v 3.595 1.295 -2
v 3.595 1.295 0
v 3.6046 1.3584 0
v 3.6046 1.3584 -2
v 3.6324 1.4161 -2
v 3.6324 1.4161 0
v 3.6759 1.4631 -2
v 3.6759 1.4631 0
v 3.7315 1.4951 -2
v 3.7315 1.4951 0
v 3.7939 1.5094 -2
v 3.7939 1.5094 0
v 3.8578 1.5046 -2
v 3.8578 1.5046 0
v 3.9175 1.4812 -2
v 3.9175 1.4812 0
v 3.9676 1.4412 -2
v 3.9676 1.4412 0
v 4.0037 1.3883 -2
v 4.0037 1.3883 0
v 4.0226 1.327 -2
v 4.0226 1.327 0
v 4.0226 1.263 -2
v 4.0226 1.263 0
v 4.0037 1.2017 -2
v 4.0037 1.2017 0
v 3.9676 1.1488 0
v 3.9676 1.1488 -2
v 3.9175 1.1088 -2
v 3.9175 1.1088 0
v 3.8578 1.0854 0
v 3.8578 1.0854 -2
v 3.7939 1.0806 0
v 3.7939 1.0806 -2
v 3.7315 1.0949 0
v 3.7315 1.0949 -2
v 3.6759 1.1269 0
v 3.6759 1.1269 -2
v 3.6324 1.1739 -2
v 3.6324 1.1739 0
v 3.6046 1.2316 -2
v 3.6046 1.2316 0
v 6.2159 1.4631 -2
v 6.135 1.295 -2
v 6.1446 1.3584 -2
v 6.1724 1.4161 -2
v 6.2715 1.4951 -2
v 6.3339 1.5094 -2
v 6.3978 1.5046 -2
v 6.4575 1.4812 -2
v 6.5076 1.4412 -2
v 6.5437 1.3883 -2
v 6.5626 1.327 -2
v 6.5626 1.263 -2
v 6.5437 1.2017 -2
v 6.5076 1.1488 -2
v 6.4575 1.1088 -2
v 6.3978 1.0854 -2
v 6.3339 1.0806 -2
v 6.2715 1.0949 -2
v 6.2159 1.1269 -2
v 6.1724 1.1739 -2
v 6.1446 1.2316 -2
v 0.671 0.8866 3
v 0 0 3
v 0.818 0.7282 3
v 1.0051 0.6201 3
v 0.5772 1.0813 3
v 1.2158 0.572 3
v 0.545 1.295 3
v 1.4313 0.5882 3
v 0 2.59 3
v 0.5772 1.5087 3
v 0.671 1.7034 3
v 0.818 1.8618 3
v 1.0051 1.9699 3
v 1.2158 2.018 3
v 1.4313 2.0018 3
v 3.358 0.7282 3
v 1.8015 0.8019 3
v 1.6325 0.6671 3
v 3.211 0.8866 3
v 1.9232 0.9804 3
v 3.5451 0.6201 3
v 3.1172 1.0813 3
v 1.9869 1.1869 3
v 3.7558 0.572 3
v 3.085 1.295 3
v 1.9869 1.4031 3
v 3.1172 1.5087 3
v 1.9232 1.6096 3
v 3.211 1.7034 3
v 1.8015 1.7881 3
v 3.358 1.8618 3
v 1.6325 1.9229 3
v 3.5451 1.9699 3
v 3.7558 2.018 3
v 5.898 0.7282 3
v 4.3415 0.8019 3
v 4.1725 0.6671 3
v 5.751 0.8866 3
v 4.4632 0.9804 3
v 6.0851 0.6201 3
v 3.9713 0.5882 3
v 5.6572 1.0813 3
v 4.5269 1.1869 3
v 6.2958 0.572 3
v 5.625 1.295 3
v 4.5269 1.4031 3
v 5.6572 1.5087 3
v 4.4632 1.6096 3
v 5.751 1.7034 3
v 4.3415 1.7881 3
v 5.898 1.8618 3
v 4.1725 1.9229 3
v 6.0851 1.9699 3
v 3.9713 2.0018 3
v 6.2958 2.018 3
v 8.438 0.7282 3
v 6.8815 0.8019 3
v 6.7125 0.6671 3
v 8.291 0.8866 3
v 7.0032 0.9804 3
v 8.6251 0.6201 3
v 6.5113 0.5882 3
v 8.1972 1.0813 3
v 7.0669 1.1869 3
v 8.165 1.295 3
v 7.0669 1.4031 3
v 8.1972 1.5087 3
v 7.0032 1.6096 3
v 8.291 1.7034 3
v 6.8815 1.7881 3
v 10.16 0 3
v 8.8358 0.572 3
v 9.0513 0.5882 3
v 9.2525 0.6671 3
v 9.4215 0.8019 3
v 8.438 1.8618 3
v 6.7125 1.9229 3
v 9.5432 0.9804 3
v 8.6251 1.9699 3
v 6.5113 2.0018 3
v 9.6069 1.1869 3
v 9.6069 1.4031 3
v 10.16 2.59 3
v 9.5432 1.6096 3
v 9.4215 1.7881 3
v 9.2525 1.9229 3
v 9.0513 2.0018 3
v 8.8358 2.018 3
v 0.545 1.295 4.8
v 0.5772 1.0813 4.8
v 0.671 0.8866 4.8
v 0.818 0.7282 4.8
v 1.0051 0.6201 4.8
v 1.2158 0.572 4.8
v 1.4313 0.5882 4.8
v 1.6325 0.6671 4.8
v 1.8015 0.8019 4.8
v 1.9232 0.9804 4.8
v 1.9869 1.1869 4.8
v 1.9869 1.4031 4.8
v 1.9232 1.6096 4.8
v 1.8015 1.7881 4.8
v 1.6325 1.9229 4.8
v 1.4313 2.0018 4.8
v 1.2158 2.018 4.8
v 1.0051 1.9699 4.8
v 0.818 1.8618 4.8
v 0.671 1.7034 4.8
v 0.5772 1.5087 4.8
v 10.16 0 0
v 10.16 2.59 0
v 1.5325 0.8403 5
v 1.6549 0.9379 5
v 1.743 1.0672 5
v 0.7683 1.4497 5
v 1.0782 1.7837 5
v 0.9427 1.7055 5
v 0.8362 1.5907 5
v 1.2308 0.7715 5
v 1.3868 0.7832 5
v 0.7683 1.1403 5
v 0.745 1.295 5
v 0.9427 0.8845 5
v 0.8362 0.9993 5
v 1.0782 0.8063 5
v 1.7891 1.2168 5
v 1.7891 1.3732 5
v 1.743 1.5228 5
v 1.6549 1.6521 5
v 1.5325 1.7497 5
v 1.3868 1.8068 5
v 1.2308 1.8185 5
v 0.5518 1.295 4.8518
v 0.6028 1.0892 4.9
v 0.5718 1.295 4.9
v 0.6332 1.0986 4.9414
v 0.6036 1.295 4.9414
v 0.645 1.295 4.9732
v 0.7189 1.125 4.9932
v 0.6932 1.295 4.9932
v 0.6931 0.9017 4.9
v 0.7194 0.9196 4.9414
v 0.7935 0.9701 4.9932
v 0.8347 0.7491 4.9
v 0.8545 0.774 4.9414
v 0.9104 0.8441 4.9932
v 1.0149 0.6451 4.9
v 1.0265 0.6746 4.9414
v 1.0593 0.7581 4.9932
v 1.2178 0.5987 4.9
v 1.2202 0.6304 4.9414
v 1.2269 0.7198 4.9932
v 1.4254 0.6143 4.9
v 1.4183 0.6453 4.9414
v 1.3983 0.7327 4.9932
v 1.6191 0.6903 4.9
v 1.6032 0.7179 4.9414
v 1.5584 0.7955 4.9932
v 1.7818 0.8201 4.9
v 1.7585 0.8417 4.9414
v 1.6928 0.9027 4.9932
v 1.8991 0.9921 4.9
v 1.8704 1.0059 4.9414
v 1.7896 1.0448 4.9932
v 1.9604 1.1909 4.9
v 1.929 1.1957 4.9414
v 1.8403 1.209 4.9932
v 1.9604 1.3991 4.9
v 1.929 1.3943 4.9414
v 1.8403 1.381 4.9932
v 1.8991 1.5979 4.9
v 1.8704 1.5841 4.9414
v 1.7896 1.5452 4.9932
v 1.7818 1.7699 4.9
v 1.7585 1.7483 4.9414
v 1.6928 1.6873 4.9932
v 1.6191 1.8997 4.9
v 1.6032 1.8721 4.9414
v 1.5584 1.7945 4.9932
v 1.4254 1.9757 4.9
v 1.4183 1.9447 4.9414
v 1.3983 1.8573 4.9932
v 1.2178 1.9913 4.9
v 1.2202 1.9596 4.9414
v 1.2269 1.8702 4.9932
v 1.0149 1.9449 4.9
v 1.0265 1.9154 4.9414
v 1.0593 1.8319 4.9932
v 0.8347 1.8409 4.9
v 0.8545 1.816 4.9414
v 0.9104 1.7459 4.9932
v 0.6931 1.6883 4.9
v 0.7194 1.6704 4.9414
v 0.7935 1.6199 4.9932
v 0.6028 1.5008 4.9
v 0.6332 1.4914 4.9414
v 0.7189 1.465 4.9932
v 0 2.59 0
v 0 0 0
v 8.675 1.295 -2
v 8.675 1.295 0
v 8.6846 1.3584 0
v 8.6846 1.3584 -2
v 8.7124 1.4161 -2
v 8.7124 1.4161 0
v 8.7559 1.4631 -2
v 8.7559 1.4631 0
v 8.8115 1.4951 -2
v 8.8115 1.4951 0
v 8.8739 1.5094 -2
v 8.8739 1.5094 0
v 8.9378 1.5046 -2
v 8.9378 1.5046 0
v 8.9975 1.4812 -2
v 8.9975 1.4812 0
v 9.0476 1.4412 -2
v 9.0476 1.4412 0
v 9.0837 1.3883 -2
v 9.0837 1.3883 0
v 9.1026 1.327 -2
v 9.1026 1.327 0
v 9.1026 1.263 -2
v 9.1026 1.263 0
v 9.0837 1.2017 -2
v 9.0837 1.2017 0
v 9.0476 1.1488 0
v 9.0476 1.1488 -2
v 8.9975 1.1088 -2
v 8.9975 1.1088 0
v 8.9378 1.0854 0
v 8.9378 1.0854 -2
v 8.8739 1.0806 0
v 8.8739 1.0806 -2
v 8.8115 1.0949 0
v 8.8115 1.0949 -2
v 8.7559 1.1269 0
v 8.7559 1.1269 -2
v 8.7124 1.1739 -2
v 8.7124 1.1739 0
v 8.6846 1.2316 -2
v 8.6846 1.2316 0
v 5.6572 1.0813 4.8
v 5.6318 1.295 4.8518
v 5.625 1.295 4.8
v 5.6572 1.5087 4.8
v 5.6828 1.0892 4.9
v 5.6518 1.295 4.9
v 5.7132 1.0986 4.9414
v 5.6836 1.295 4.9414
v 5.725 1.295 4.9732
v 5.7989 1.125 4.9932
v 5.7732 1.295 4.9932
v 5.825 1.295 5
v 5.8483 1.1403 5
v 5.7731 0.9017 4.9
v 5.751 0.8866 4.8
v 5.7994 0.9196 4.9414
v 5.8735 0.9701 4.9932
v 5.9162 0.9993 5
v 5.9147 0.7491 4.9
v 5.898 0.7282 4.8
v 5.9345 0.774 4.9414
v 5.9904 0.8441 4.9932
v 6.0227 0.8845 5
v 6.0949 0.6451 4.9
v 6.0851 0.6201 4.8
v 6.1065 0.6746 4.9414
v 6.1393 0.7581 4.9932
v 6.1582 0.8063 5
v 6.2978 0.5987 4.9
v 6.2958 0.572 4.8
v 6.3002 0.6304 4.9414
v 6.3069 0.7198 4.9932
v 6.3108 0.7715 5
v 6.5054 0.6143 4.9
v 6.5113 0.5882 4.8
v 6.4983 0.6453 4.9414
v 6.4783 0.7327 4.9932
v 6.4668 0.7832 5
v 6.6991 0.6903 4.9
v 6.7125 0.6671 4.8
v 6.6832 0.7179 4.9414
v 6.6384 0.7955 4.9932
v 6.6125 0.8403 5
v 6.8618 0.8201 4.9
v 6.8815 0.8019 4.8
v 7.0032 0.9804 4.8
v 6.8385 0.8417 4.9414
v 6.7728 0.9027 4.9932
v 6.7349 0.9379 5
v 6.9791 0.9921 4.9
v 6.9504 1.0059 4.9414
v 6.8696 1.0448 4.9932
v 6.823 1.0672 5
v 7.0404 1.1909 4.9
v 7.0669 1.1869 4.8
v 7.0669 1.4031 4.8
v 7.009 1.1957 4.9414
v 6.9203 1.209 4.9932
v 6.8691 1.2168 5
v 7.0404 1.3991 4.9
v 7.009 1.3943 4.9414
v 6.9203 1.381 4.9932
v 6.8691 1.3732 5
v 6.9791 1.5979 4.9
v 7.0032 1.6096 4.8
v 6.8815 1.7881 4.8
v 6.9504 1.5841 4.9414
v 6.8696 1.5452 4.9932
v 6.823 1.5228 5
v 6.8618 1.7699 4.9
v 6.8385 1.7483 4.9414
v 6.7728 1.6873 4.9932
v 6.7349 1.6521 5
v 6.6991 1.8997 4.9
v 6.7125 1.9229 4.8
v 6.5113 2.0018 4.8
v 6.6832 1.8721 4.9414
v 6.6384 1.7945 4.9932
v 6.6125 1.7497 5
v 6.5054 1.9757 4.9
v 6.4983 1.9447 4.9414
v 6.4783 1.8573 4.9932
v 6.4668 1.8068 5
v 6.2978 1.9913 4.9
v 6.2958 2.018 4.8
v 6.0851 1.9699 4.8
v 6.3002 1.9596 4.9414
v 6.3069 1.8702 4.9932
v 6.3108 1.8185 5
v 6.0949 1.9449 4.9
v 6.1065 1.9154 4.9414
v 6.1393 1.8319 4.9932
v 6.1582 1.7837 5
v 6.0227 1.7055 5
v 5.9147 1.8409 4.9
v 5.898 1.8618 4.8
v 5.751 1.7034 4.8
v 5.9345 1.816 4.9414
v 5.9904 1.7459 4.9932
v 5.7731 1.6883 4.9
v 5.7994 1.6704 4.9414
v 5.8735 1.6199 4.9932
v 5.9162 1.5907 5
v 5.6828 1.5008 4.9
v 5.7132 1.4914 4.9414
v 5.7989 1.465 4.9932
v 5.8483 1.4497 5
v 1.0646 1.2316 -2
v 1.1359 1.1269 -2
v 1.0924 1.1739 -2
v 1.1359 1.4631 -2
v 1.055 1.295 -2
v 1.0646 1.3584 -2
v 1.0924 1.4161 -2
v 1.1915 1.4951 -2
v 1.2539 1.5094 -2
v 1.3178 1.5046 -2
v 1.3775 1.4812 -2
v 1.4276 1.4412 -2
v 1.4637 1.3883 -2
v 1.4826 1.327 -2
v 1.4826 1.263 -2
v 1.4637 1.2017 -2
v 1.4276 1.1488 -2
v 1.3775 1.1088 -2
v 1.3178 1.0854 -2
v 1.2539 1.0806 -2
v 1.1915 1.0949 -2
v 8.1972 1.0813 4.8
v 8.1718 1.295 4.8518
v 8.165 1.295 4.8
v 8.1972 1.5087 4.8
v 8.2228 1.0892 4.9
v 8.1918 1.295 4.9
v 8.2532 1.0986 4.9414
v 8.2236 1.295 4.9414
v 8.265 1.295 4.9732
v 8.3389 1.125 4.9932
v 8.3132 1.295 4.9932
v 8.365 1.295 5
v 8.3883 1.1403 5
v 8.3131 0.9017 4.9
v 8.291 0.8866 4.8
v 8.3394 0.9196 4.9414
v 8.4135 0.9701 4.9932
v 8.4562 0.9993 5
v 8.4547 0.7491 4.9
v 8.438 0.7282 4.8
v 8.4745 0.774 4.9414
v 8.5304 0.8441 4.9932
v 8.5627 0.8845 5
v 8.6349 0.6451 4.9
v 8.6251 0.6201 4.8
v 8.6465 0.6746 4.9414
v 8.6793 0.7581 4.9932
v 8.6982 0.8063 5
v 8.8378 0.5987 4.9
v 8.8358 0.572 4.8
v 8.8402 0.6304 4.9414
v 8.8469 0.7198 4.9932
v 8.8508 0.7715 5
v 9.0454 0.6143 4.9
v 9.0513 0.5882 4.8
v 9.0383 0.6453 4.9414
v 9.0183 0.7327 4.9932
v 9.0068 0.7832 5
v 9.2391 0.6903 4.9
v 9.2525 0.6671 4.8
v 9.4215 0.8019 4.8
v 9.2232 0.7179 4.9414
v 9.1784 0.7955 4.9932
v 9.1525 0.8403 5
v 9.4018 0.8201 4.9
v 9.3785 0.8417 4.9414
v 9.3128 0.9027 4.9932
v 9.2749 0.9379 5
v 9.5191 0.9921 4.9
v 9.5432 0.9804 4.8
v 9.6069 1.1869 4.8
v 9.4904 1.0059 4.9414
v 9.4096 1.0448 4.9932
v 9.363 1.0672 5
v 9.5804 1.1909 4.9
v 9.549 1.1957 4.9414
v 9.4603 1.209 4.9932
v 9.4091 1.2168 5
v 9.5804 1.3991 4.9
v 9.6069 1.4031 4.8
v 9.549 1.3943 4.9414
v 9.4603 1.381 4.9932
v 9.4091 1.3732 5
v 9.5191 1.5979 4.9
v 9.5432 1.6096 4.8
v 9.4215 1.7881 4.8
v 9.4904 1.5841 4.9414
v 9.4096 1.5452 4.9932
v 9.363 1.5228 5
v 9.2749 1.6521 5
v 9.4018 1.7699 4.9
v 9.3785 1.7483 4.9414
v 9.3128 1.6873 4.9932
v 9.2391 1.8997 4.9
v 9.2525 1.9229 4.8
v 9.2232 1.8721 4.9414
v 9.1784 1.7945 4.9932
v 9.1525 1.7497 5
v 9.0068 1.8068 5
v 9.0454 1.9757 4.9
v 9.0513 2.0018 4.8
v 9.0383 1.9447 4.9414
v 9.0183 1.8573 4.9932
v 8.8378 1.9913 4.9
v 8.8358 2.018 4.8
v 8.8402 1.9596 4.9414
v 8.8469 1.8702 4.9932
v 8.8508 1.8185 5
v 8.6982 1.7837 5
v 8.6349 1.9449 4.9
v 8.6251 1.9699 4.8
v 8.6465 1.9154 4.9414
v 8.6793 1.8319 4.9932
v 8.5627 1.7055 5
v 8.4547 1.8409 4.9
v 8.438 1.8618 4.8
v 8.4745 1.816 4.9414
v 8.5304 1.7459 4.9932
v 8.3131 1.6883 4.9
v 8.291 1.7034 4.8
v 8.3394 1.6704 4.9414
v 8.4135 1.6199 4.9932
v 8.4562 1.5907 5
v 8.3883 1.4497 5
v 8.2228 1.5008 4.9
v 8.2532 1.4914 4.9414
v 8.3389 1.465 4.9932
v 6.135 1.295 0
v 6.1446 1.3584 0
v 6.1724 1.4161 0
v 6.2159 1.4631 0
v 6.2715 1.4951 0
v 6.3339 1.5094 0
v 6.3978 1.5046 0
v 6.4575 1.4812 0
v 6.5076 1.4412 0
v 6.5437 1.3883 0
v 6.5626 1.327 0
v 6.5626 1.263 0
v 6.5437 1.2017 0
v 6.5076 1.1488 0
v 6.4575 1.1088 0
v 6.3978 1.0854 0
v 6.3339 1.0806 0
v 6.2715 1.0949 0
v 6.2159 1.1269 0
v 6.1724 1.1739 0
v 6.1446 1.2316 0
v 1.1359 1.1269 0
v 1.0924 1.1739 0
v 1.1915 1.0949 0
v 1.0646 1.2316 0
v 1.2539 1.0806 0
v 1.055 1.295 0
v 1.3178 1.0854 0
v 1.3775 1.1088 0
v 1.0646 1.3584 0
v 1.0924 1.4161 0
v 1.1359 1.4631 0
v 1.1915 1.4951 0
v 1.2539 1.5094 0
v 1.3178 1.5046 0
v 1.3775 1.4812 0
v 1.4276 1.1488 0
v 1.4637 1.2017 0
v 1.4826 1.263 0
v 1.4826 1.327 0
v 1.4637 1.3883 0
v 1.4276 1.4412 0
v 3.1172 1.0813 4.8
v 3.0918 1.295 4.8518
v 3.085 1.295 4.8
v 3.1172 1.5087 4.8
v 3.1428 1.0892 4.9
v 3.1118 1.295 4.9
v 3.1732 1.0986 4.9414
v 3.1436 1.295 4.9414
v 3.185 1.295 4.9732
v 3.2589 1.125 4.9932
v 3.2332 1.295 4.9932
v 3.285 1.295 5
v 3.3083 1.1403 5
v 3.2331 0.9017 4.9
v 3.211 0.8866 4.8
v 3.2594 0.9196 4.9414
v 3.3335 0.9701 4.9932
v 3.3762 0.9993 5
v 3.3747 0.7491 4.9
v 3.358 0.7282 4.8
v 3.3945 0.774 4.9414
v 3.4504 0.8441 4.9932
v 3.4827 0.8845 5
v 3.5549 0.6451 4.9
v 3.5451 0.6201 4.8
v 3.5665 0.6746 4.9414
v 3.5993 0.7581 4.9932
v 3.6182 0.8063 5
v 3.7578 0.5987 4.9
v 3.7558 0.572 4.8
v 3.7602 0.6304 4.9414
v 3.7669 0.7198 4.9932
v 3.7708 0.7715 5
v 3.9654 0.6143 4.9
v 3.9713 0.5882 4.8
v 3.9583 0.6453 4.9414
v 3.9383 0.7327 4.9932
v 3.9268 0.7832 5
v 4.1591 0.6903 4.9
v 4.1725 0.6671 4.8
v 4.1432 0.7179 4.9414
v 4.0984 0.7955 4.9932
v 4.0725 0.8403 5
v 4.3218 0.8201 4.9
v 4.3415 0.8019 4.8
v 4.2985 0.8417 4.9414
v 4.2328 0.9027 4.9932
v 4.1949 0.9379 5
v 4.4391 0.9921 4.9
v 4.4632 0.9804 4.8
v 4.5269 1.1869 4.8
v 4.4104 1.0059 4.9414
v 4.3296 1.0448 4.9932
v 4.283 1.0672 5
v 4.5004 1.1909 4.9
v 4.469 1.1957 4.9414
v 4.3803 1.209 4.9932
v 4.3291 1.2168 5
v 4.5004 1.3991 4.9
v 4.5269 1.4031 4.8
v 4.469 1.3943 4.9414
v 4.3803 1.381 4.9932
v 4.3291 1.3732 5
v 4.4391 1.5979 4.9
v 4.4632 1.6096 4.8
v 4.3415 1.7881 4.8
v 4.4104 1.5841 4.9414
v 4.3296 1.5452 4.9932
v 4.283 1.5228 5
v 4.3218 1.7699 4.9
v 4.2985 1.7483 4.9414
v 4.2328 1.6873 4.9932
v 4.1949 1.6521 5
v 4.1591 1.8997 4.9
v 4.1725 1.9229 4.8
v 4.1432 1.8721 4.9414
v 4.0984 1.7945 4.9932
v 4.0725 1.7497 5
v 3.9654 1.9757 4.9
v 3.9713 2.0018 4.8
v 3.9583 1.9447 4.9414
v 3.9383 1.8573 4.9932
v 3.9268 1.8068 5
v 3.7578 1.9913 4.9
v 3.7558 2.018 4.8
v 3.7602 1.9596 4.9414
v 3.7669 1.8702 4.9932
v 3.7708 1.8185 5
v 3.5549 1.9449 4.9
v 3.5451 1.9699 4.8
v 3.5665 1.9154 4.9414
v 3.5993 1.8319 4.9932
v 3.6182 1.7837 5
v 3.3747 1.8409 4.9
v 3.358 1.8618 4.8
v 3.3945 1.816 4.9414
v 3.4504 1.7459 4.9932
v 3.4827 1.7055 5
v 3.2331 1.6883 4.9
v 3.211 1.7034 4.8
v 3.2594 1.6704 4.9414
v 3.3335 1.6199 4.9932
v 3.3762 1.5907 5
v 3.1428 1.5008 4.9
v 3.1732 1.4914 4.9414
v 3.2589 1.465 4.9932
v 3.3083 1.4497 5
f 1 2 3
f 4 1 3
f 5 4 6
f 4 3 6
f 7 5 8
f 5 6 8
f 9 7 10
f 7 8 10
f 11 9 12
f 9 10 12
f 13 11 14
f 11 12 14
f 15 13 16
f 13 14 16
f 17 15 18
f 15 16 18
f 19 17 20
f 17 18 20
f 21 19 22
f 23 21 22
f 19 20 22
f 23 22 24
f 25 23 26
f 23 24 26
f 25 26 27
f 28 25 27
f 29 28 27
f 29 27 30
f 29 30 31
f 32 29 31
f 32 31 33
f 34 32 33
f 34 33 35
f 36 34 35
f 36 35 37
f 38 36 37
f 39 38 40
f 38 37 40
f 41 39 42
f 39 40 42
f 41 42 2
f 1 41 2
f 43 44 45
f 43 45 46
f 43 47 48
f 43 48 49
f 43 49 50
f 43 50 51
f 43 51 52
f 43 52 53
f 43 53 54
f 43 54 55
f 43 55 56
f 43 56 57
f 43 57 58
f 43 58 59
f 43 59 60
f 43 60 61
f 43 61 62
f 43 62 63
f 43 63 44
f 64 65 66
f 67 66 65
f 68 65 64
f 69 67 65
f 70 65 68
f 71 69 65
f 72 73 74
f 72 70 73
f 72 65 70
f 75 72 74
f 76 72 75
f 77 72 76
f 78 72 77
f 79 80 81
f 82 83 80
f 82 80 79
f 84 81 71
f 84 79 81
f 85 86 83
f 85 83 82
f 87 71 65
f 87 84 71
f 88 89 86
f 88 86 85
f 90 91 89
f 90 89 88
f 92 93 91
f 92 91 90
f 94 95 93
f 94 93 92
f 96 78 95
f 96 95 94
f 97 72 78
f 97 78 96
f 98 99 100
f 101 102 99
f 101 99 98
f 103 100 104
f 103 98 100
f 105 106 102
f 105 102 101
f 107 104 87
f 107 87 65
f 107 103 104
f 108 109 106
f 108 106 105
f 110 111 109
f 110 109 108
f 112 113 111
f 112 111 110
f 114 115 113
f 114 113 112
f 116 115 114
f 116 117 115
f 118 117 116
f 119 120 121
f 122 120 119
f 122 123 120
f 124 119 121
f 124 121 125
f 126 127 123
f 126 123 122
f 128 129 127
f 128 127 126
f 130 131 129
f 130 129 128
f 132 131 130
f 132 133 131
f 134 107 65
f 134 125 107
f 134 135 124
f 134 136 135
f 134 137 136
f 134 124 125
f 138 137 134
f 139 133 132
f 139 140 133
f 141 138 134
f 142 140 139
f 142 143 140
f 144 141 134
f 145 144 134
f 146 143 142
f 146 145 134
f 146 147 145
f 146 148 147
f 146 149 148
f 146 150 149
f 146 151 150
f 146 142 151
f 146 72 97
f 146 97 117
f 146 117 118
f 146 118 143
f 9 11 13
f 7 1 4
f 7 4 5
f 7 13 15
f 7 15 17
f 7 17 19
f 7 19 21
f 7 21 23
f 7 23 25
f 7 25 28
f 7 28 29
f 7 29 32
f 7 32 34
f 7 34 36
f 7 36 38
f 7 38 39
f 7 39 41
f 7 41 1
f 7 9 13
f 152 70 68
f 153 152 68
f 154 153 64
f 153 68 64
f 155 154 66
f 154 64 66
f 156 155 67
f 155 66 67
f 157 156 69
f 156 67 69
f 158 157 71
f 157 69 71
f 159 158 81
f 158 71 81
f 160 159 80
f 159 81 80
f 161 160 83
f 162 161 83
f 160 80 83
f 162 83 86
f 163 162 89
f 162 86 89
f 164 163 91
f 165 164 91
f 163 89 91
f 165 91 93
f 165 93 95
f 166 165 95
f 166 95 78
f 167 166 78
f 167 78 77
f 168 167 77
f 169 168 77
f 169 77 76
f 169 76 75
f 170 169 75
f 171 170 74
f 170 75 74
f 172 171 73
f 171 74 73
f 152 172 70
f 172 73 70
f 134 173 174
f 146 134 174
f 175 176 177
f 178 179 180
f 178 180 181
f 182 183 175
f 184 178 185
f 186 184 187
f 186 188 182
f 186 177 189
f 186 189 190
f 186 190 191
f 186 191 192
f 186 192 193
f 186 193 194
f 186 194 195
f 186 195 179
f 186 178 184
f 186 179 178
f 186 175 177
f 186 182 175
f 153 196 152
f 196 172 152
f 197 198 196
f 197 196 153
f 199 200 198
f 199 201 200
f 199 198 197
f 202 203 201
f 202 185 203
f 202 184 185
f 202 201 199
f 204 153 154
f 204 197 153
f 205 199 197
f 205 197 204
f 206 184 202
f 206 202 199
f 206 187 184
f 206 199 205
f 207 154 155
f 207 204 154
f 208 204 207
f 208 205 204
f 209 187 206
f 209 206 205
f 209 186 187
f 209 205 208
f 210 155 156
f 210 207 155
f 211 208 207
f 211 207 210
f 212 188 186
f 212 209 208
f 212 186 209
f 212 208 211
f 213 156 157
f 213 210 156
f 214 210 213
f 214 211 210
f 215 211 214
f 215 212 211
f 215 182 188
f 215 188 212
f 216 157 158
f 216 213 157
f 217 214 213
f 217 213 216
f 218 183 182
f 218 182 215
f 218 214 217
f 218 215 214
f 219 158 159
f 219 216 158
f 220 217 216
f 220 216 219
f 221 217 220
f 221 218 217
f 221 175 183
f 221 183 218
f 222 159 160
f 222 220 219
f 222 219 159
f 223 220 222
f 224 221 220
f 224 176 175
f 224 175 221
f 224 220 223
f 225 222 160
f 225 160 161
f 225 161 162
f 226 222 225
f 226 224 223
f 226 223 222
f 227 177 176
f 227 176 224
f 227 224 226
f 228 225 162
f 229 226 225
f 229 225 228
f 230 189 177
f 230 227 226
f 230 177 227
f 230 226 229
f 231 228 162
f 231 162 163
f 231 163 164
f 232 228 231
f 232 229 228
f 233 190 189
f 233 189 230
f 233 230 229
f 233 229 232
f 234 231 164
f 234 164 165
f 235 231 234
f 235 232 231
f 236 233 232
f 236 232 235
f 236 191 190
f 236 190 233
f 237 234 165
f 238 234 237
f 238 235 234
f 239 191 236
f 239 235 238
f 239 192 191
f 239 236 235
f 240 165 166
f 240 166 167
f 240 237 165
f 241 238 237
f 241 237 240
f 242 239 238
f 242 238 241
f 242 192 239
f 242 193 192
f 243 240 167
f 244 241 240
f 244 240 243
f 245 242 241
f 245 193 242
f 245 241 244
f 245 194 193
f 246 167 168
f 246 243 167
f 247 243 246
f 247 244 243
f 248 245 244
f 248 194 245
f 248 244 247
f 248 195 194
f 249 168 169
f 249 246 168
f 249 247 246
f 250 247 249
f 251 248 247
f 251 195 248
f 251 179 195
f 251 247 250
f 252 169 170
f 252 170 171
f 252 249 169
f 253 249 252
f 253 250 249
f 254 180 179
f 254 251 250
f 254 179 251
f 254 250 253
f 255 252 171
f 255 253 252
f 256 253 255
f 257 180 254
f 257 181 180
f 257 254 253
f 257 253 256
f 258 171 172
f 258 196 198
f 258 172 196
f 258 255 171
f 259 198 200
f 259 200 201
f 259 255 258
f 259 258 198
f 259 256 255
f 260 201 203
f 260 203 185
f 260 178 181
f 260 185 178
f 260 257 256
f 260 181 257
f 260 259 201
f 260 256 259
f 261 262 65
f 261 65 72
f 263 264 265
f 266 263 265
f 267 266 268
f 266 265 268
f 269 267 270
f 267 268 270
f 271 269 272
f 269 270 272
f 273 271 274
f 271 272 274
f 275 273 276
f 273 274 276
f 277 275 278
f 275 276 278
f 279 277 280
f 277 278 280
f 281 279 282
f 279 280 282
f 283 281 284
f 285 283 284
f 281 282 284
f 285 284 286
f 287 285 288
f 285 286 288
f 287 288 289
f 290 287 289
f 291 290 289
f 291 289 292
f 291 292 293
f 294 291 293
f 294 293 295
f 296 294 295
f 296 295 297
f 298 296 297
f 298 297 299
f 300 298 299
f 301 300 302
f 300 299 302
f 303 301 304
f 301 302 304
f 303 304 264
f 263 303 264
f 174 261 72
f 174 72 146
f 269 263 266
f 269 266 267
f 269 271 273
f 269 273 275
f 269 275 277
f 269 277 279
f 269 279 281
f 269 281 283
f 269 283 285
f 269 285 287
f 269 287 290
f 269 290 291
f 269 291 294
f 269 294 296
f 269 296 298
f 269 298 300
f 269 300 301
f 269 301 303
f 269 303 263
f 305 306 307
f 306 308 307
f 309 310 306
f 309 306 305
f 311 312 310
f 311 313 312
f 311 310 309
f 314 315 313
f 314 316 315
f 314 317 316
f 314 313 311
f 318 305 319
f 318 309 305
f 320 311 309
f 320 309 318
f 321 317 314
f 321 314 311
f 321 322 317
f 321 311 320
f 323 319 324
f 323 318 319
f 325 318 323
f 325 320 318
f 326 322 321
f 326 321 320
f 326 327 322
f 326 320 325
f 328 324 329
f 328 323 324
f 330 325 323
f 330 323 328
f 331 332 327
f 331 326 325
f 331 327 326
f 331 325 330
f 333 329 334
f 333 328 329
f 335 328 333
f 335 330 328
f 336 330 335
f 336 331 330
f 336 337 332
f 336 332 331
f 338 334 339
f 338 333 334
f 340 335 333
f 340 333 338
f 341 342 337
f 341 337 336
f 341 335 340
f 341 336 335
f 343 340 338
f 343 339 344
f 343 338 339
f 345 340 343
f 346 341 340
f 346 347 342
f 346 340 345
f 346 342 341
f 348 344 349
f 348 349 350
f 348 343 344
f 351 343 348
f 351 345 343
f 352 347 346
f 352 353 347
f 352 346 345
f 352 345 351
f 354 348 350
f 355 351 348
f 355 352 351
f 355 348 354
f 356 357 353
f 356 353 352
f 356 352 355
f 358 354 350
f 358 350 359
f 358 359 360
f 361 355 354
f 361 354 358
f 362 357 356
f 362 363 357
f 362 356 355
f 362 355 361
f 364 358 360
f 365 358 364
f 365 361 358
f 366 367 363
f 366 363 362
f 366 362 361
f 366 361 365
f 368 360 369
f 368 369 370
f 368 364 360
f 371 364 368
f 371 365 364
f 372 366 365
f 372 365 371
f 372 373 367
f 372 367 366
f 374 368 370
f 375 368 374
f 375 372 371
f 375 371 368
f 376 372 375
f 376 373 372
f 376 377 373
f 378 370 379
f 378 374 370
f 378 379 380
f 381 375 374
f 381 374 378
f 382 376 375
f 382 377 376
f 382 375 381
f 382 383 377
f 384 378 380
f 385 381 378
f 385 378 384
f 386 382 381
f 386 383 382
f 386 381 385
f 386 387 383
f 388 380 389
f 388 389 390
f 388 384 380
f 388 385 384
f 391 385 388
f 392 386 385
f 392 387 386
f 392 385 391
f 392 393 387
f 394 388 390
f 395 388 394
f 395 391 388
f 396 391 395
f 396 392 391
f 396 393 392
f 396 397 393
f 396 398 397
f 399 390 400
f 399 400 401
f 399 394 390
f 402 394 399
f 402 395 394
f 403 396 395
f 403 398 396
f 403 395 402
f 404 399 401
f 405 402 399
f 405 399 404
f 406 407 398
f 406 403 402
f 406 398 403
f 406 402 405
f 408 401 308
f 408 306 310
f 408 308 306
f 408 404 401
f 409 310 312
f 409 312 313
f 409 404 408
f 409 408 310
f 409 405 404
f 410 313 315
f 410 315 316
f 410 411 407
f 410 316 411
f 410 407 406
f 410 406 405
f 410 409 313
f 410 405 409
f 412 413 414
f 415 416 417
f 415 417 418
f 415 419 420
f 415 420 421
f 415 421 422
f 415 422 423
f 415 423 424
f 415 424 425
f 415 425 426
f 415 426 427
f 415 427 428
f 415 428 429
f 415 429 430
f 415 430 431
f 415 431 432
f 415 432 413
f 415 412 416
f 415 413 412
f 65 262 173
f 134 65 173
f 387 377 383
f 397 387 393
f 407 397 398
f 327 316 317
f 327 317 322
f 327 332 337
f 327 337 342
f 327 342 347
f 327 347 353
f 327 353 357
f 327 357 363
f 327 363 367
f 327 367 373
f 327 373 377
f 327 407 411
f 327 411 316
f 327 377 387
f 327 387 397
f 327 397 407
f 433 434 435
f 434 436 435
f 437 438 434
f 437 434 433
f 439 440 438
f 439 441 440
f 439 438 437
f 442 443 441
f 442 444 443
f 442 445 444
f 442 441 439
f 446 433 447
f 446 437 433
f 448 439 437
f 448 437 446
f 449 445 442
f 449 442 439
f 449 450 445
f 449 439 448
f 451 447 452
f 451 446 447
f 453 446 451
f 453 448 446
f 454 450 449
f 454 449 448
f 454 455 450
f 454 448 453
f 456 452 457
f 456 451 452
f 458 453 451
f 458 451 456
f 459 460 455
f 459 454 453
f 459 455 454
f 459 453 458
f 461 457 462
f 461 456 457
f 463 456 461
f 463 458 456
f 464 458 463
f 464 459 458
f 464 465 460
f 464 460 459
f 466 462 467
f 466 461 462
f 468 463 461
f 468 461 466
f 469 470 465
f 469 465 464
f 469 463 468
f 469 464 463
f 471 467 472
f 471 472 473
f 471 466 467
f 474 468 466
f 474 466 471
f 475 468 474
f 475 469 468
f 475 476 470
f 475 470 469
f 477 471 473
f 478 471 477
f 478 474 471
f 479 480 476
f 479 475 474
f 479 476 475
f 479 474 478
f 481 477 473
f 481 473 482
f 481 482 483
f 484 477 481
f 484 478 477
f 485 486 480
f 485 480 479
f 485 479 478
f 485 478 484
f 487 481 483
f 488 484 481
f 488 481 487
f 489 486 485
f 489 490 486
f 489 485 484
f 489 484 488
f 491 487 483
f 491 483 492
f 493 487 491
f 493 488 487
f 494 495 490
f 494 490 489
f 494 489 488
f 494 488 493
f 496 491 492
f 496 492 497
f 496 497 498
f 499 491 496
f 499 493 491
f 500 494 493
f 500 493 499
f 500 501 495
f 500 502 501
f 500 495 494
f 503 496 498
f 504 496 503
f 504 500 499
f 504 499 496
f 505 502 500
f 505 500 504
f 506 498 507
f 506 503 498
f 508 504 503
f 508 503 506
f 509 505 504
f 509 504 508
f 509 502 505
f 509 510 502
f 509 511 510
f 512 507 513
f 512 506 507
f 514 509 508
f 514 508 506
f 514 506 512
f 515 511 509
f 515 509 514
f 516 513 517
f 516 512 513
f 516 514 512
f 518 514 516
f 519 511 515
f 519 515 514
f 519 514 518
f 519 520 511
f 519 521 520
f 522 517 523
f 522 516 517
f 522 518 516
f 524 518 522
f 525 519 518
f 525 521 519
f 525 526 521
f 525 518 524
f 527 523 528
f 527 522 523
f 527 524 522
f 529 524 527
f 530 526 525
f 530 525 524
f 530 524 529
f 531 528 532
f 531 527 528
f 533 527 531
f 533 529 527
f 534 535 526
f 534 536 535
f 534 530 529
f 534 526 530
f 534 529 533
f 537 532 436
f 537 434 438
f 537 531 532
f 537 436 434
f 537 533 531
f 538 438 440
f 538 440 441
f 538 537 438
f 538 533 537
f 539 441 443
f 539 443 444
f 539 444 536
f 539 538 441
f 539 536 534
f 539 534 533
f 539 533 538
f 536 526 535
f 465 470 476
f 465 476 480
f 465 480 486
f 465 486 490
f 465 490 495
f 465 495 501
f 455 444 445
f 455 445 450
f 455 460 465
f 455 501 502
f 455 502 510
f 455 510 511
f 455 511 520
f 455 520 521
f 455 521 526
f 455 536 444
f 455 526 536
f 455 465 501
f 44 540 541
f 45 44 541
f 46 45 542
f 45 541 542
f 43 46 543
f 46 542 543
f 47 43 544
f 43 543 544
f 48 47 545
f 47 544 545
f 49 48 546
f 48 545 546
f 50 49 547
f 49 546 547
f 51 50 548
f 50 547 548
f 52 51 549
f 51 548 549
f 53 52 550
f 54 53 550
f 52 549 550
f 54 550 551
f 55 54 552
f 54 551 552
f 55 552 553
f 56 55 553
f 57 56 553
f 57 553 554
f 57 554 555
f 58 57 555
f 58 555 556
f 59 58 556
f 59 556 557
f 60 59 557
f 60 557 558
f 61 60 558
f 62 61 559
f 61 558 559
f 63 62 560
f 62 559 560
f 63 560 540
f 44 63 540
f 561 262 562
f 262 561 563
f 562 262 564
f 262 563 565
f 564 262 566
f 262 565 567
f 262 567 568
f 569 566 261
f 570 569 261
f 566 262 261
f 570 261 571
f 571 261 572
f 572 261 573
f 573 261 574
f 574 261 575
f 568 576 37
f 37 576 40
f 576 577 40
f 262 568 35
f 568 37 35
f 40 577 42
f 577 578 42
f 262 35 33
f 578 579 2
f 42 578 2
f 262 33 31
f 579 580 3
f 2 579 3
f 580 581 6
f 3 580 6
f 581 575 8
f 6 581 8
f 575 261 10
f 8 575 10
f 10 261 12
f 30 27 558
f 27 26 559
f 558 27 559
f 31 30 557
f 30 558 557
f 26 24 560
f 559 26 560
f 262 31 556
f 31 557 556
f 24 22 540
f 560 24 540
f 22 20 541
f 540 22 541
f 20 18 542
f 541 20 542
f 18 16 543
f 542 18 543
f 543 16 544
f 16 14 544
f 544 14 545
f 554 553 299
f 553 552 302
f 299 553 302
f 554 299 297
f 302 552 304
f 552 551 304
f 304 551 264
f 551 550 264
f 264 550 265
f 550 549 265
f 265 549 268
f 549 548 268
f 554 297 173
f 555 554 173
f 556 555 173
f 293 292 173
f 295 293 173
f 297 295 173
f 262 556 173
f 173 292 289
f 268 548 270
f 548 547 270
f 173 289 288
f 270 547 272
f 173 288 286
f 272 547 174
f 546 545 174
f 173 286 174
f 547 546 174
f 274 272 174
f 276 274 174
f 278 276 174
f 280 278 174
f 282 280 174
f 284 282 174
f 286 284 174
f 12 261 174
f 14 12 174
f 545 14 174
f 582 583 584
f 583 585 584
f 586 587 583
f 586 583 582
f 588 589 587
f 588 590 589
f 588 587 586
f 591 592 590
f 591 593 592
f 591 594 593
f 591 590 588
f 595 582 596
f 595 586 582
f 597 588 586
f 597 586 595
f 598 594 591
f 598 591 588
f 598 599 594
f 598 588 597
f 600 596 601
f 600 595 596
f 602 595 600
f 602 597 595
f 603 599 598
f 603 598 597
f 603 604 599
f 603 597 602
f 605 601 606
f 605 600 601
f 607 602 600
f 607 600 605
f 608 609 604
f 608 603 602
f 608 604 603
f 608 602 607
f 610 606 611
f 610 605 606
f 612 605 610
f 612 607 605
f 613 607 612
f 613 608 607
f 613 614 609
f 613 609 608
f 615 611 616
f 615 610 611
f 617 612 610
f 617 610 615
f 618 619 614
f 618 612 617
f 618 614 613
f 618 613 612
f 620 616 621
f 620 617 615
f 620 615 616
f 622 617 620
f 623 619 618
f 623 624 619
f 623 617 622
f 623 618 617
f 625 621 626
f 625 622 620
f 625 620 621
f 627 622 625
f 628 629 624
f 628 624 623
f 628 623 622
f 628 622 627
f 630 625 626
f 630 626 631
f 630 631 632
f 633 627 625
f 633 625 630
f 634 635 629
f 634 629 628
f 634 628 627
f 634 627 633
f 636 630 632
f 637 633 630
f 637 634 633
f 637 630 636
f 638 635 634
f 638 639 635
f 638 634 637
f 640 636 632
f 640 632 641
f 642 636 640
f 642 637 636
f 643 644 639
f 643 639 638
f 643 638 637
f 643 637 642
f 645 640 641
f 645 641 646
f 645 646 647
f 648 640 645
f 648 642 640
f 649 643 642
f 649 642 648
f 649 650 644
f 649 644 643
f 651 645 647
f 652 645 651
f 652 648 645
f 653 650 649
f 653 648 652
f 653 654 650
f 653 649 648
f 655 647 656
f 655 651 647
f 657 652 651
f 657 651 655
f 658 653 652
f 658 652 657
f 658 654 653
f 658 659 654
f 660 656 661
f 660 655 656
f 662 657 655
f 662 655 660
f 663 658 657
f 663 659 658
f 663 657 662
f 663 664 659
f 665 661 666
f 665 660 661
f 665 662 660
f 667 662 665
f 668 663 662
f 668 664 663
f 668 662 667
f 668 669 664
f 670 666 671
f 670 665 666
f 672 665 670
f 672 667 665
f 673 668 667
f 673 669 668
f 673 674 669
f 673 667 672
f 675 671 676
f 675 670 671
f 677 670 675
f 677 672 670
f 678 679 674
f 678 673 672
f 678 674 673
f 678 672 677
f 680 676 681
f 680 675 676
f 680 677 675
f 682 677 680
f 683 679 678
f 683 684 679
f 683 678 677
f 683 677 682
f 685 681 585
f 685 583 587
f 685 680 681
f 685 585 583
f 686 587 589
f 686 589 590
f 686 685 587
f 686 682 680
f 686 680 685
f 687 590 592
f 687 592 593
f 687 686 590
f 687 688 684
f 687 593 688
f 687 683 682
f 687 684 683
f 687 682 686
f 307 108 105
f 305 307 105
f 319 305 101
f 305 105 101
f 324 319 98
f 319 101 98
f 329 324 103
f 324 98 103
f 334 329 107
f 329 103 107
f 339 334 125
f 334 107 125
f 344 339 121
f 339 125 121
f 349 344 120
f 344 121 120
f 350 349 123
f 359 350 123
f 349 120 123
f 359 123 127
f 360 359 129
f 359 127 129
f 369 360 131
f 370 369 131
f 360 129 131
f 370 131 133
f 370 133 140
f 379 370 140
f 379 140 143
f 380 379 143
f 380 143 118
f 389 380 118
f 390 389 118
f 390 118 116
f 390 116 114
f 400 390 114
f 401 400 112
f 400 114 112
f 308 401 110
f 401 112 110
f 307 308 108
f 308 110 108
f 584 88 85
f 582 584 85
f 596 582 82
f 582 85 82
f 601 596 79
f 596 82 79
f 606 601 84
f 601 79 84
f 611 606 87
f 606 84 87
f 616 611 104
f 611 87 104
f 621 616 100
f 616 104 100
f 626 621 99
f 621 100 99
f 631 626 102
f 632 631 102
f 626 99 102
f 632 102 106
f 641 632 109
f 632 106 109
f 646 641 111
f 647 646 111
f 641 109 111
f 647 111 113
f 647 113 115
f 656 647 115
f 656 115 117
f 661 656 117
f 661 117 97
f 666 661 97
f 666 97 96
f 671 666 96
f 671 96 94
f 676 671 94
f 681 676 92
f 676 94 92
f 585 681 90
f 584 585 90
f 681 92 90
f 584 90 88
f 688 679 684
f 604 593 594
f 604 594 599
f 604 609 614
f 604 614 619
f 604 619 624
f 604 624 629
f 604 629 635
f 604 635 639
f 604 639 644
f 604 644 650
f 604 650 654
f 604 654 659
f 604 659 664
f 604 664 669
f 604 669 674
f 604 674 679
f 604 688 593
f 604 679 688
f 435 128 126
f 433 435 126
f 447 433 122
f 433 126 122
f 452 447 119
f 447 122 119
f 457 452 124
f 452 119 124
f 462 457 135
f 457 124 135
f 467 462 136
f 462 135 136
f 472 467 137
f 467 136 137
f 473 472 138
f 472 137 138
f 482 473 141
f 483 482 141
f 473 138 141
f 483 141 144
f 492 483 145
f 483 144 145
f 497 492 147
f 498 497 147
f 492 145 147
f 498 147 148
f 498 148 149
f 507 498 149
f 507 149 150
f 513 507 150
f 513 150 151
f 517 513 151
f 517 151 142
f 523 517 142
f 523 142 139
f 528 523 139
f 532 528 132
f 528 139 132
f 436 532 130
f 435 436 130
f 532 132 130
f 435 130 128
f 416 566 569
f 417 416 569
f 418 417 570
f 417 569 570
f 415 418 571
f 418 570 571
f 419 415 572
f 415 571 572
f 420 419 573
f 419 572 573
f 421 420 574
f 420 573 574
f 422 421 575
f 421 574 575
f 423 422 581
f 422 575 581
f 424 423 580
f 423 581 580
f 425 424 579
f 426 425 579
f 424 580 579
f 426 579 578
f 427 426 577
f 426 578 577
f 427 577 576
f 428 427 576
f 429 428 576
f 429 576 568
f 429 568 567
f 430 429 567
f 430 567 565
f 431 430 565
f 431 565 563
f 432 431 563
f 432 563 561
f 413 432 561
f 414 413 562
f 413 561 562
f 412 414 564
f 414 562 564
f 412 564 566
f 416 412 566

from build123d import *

# Parameters (mm, degrees)
SKETCH_1_W      = 10.16
SKETCH_1_H      = 2.59
EXTRUDE_1_DEPTH = 3
SKETCH_2_R      = 0.725
EXTRUDE_2_DEPTH = 2
SKETCH_3_R      = 0.215
EXTRUDE_3_DEPTH = 2
FILLET_1_R      = 0.2


with BuildPart() as part:
    # Эскиз1 → Бобышка-Вытянуть1 (new body)
    with BuildSketch(Plane.XY):
        with Locations((5.08, 1.295)):
            Rectangle(SKETCH_1_W, SKETCH_1_H)
    extrude(amount=EXTRUDE_1_DEPTH)

    # Эскиз2 → Бобышка-Вытянуть2 (add)
    with BuildSketch(Plane.XY.offset(3)):
        with Locations(Location((1.27, 1.295, 0), (0, 0, 180))):
            Circle(SKETCH_2_R)
        with Locations(Location((3.81, 1.295, 0), (0, 0, 180))):
            Circle(SKETCH_2_R)
        with Locations(Location((6.35, 1.295, 0), (0, 0, 180))):
            Circle(SKETCH_2_R)
        with Locations(Location((8.89, 1.295, 0), (0, 0, 180))):
            Circle(SKETCH_2_R)
    extrude(amount=EXTRUDE_2_DEPTH)

    # Эскиз3 → Бобышка-Вытянуть3 (add)
    with BuildSketch(Plane(origin=(0, 0, 0), x_dir=(-1, 0, 0), z_dir=(0, 0, -1))):
        with Locations((-1.27, 1.295)):
            Circle(SKETCH_3_R)
        with Locations((-3.81, 1.295)):
            Circle(SKETCH_3_R)
        with Locations((-6.35, 1.295)):
            Circle(SKETCH_3_R)
        with Locations((-8.89, 1.295)):
            Circle(SKETCH_3_R)
    extrude(amount=EXTRUDE_3_DEPTH)

    # Скругление1
    fillet_1_edges = [part.edges().sort_by_distance(p)[0] for p in [
        (1.995, 1.295, 5),
        (4.535, 1.295, 5),
        (7.075, 1.295, 5),
        (9.615, 1.295, 5),
    ]]
    fillet(fillet_1_edges, radius=FILLET_1_R)


solid = part.part
